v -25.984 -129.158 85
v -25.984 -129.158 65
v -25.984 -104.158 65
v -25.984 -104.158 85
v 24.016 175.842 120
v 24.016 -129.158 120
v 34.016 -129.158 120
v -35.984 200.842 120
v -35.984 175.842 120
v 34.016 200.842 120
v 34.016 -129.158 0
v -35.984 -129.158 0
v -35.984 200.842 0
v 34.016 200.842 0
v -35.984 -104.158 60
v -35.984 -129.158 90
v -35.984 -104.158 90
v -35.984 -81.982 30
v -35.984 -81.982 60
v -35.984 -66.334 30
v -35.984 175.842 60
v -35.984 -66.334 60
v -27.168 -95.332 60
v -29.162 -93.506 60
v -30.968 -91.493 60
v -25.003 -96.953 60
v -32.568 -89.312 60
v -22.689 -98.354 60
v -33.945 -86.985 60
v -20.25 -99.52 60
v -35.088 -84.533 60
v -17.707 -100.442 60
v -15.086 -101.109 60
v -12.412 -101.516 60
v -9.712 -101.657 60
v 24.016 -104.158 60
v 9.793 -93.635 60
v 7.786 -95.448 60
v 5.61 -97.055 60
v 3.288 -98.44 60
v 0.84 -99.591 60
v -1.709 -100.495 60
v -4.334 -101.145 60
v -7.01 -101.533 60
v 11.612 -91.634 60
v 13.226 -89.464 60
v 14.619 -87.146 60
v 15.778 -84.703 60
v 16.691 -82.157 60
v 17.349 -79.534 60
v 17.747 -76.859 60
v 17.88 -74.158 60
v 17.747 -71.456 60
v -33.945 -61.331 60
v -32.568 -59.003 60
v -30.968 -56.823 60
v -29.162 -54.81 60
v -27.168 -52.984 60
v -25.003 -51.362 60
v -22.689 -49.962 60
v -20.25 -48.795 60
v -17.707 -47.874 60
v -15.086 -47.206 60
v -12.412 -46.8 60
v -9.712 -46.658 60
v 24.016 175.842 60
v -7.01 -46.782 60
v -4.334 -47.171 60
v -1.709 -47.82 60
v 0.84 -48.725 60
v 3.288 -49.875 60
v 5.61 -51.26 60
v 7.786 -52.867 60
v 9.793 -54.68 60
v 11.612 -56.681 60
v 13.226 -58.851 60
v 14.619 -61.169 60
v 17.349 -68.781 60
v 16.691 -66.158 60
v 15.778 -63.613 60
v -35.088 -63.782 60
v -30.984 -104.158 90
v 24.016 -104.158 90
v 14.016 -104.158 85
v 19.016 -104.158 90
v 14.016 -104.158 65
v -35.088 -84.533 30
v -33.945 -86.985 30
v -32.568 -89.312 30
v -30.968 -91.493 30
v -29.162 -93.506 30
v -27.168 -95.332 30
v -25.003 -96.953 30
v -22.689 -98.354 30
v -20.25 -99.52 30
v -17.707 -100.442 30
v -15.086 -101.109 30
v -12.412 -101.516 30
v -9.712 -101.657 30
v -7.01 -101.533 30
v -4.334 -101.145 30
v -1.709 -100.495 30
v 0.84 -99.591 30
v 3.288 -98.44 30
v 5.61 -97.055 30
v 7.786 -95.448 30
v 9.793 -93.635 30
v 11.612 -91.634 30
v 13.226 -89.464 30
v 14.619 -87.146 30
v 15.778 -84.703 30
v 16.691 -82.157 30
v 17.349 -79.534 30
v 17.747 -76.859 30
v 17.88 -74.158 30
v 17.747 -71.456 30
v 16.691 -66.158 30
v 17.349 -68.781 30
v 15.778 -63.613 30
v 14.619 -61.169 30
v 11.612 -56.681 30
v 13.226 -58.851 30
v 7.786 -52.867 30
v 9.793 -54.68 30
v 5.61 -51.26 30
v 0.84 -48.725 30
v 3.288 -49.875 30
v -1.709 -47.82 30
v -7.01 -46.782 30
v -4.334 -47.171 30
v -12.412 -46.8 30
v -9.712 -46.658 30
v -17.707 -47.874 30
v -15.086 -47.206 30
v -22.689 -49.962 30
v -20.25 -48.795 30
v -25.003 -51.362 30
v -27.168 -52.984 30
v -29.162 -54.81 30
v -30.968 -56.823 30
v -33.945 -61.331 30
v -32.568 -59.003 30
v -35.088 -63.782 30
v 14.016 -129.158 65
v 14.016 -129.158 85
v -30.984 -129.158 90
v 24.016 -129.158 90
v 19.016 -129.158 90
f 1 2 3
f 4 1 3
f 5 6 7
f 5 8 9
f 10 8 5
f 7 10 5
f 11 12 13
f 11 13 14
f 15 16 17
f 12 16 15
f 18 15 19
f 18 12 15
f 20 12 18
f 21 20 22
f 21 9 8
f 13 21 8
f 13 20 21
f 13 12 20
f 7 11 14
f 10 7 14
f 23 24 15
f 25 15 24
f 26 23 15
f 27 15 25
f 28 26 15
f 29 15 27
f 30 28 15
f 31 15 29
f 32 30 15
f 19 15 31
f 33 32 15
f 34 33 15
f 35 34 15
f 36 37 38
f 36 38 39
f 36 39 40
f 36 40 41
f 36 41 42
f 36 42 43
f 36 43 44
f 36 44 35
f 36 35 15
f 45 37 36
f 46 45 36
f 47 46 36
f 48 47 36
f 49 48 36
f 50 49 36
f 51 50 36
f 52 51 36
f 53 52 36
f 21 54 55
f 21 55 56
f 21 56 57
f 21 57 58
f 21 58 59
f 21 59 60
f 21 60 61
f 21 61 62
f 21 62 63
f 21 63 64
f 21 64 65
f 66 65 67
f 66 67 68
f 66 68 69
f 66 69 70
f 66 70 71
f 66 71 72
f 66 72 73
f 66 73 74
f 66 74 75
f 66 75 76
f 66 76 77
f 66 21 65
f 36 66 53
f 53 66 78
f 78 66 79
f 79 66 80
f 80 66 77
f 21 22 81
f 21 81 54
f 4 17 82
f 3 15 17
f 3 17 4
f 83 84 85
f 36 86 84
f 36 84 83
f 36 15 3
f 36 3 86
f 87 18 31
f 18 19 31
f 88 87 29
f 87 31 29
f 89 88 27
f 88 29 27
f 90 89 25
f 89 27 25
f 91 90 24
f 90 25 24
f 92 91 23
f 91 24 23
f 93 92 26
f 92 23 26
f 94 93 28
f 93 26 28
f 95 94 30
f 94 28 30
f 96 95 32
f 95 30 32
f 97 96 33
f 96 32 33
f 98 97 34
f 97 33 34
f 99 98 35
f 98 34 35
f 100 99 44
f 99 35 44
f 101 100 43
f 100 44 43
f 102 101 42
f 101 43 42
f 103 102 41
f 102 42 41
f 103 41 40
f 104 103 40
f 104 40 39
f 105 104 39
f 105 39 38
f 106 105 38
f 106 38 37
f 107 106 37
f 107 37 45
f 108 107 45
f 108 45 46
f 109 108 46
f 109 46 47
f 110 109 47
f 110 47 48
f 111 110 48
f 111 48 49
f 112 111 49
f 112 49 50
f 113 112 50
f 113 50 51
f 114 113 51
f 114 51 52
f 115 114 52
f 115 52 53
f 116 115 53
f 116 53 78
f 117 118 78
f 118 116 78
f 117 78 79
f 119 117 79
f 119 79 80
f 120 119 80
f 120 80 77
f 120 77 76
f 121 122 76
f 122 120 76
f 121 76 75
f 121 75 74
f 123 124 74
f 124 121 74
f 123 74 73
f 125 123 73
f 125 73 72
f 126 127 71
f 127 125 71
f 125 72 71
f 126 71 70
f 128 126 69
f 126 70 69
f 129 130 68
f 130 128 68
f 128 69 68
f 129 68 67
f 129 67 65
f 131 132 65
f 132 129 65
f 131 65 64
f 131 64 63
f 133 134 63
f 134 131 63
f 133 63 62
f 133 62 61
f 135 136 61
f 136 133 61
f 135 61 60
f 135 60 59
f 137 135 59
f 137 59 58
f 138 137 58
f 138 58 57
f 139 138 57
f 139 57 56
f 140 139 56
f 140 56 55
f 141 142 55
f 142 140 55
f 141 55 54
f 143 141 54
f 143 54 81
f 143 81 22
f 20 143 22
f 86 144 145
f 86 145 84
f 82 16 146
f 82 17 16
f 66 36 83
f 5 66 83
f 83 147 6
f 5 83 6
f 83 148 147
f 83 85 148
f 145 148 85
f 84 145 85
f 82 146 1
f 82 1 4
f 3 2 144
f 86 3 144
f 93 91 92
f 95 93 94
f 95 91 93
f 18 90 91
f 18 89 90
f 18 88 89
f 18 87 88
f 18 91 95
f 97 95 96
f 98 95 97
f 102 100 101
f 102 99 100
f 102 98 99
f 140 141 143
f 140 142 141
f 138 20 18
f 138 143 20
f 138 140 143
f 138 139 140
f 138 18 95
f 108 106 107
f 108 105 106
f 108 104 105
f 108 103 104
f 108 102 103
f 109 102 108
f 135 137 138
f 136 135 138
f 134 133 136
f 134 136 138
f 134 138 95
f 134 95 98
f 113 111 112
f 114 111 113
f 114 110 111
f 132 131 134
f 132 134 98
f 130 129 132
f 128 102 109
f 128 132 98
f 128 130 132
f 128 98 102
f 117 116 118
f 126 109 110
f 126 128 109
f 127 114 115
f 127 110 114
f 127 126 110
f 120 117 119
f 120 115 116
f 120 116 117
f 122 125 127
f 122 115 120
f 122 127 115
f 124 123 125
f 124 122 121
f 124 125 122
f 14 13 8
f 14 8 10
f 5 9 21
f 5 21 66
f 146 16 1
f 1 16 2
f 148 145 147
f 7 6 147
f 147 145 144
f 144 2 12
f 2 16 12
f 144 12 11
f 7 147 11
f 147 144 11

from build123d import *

# Parameters (mm, degrees)
F0_W      = 70
F0_H      = 330
F1_DEPTH  = 120
F2_W      = 60
F2_H      = 280
F3_DEPTH  = 60
F4_R      = 27.5
F5_DEPTH  = 30
F6_W      = 60
F6_H      = 55
F7_DEPTH  = 25
F8_W      = 10
F8_H      = 25
F9_DEPTH  = 25
F10_DEPTH = 25
F11_SIZE  = 5
F12_SIZE  = 5


with BuildPart() as f1:
    # F0 (on Top) → F1 (new body)
    with BuildSketch(Plane.XY):
        with Locations((-0.983767, 35.842364)):
            Rectangle(F0_W, F0_H)
    extrude(amount=F1_DEPTH)

    # F2 (on face) → F3 (cut)
    with BuildSketch(Plane.XY.offset(120)):
        with Locations((-5.983767, 35.842364)):
            Rectangle(F2_W, F2_H)
    extrude(amount=-F3_DEPTH, mode=Mode.SUBTRACT)

    # F4 (on face) → F5 (cut)
    with BuildSketch(Plane.XY.offset(60)):
        with Locations((-9.620236, -74.157636)):
            Circle(F4_R)
    extrude(amount=-F5_DEPTH, mode=Mode.SUBTRACT)

    # F6 (on face) → F7 (cut, through all)
    with BuildSketch(Plane.XZ.offset(129.157636)):
        with Locations((-5.983767, 92.5)):
            Rectangle(F6_W, F6_H)
    extrude(amount=-F7_DEPTH, mode=Mode.SUBTRACT)

    # F8 (on face) → F9 (join)
    with BuildSketch(Plane.XY.offset(65)):
        with Locations((-30.983767, -116.657636)):
            Rectangle(F8_W, F8_H)
    extrude(amount=F9_DEPTH)

    # F8 (on face) → F10 (join)
    with BuildSketch(Plane.XY.offset(65)):
        with Locations((19.016233, -116.657636)):
            Rectangle(F8_W, F8_H)
    extrude(amount=F10_DEPTH)

    # F11
    f11_edges = [f1.edges().sort_by_distance(p)[0] for p in [
        (14.016233, -116.657636, 90),
    ]]
    chamfer(f11_edges, length=F11_SIZE)

    # F12
    f12_edges = [f1.edges().sort_by_distance(p)[0] for p in [
        (-25.983767, -116.657636, 90),
    ]]
    chamfer(f12_edges, length=F12_SIZE)


solid = f1.part
